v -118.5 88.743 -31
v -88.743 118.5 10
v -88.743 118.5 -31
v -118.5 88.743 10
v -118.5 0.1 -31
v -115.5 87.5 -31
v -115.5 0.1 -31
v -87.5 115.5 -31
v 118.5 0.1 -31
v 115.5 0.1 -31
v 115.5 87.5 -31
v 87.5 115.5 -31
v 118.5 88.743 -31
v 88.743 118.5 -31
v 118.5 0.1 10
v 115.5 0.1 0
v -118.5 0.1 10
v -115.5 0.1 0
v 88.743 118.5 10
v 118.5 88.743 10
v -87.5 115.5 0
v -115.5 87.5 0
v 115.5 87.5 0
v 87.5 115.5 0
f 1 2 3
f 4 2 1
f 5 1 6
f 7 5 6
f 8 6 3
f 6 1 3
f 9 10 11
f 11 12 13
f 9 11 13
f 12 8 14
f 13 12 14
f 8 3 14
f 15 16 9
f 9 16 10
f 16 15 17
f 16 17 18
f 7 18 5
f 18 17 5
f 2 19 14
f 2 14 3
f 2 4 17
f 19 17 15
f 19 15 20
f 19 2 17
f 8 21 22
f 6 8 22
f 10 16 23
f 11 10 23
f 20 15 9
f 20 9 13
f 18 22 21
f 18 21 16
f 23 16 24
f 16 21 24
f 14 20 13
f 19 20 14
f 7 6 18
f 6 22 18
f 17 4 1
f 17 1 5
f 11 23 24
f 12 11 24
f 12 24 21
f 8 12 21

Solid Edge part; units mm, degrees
sketch "Sketch1" plane through (0, 0, 0) normal (0, 0, 1) x (1, 0, 0)
  line L0 (-115.5, -115.5) -> (115.5, -115.5)
  line L1 (115.5, -115.5) -> (115.5, 87.5)
  line L2 (115.5, 87.5) -> (87.5, 115.5)
  line L3 (87.5, 115.5) -> (-87.5, 115.5)
  line L4 (-87.5, 115.5) -> (-115.5, 87.5)
  line L5 (-115.5, 87.5) -> (-115.5, -115.5)
extrude "Protrusion1" add sketch "Sketch1" along normal blind 10
sketch "Sketch2" plane through (0, 0, 10) normal (0, 0, 1) x (1, 0, 0)
  line L0 (88.7426, 118.5) -> (-88.7426, 118.5)
  line L1 (-88.7426, 118.5) -> (-118.5, 88.7426)
  line L2 (-118.5, 88.7426) -> (-118.5, -118.5)
  line L3 (-118.5, -118.5) -> (118.5, -118.5)
  line L4 (118.5, -118.5) -> (118.5, 88.7426)
  line L5 (118.5, 88.7426) -> (88.7426, 118.5)
  line L6 (87.5, 115.5) -> (-87.5, 115.5)
  line L7 (-87.5, 115.5) -> (-115.5, 87.5)
  line L8 (-115.5, 87.5) -> (-115.5, -115.5)
  line L9 (-115.5, -115.5) -> (115.5, -115.5)
  line L10 (115.5, -115.5) -> (115.5, 87.5)
  line L11 (115.5, 87.5) -> (87.5, 115.5)
  dimension "D1" = 3
  dimension "D2" = 3
extrude "Protrusion2" add sketch "Sketch2" against normal blind 41
sketch "Sketch3" plane through (-118.5, -14.8787, -10.5) normal (-1, 0, 0) x (0, -1, 0)
  line L0 (103.6213, 20.5) -> (-14.9787, 20.5)
  line L1 (-14.9787, 20.5) -> (-14.9787, -20.5)
  line L2 (-14.9787, -20.5) -> (103.6213, -20.5)
  line L3 (103.6213, -20.5) -> (103.6213, 20.5)
extrude "Cutout1" cut sketch "Sketch3" against normal blind 280
